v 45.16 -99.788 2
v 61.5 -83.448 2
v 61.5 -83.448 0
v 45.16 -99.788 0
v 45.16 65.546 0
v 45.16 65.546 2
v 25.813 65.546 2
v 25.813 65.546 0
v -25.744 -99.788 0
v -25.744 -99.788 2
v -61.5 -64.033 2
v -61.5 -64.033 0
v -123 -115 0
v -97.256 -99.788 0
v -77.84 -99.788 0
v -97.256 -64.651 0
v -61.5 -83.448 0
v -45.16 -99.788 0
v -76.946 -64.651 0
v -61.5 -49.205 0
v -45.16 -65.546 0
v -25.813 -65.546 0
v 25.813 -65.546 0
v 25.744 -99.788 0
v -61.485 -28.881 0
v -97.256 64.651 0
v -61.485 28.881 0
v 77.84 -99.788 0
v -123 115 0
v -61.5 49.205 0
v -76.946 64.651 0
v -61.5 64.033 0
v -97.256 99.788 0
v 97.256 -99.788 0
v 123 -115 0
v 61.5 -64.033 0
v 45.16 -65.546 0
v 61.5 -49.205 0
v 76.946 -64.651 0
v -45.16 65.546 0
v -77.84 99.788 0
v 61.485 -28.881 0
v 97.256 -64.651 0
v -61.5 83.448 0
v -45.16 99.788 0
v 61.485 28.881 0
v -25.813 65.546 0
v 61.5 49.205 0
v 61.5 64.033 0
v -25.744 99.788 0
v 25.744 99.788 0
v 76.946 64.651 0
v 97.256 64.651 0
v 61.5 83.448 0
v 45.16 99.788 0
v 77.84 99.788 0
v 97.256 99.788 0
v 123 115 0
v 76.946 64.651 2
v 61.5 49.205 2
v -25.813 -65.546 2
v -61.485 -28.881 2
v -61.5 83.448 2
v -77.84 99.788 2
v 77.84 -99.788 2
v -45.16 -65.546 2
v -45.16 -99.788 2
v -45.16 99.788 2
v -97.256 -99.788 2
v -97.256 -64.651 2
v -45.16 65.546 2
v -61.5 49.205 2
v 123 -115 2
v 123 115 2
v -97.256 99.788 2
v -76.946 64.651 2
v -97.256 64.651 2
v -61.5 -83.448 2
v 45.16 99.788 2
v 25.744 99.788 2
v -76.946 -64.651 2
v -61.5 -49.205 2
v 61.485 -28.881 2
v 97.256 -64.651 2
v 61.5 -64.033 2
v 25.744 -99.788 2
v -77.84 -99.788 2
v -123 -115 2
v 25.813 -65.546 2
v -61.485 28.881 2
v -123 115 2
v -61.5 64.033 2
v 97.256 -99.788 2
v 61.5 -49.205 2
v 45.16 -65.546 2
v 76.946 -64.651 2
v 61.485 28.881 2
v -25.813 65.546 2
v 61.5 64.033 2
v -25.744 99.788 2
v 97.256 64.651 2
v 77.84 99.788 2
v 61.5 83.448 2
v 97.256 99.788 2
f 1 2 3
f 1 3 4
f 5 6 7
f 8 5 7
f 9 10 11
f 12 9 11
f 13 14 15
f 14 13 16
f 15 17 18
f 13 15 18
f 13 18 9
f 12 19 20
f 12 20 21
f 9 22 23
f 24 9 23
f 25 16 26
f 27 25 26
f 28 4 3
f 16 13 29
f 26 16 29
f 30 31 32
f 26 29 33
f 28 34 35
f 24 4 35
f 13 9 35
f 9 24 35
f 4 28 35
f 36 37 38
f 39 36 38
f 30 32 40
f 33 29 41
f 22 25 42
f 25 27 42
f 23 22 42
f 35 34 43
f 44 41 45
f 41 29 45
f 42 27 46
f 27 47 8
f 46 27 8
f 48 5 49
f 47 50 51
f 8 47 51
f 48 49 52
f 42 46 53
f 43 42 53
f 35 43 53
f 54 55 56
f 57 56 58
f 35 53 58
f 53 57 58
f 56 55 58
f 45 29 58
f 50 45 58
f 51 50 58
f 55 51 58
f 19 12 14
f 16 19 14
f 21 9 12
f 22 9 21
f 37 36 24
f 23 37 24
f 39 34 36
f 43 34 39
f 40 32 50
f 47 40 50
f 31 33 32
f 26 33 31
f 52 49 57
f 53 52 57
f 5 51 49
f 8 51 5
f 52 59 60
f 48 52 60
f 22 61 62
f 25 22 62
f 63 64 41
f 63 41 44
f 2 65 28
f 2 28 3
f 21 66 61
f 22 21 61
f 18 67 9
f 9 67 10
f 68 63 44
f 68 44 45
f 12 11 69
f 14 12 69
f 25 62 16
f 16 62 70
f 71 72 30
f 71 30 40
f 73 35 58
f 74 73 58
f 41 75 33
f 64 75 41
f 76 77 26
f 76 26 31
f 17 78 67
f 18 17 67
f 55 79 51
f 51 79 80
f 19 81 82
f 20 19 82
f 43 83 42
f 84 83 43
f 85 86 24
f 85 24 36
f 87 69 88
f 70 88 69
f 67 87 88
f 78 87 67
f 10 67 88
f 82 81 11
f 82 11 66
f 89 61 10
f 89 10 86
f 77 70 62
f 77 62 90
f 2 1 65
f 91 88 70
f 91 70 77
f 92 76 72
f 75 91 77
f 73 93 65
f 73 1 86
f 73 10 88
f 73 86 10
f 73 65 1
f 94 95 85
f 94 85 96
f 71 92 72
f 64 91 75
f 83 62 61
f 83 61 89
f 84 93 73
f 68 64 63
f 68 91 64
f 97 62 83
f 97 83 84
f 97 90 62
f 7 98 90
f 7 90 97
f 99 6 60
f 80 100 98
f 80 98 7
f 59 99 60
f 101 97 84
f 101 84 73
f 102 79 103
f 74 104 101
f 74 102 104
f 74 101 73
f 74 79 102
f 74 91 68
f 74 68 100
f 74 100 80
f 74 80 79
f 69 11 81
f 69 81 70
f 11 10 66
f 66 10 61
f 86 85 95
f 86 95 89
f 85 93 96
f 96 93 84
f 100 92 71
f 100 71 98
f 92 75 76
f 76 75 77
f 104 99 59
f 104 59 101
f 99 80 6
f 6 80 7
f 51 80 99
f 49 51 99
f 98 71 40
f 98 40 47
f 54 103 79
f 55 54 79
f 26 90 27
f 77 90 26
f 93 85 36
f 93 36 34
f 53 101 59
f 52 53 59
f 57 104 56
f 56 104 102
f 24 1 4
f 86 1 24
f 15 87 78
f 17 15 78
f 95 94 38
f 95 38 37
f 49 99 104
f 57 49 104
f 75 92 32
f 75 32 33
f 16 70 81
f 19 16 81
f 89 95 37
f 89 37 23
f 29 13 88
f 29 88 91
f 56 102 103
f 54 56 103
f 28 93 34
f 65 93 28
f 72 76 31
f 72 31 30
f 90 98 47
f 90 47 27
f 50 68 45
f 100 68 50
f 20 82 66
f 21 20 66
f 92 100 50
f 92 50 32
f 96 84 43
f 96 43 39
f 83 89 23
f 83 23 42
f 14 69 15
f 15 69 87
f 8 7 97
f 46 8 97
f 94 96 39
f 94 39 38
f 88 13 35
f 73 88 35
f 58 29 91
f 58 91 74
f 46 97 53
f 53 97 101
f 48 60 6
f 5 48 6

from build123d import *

# Parameters (mm, degrees)
SKETCH_1_W            = 246
SKETCH_1_H            = 230
EXTRUDE_1_DEPTH       = 2
CUT_EXTRUDE_2_DEPTH   = 169.398337284
MIRROR_2_COPY_1_DEPTH = 169.398337284


with BuildPart() as part:
    # 草图1 → 凸台-拉伸1 (new body)
    with BuildSketch(Plane.XY):
        Rectangle(SKETCH_1_W, SKETCH_1_H)
    extrude(amount=EXTRUDE_1_DEPTH)

    # 草图2 → 切除-拉伸2 (cut, through all)
    with BuildSketch(Plane.XY.offset(2)):
        Polygon((-61.485344815, -28.880757709), (-97.255935728, -64.651348622), (-76.945987349, -64.651348622), (-61.5, -49.205361273), (-45.159781882, -65.545579391), (-25.813195161, -65.545579391), align=None)
        Polygon((-61.5, -64.03252581), (-97.255935728, -99.788461538), (-77.840218118, -99.788461538), (-61.5, -83.44824342), (-45.159781882, -99.788461538), (-25.744064272, -99.788461538), align=None)
    cut_extrude_2 = extrude(amount=-CUT_EXTRUDE_2_DEPTH, mode=Mode.SUBTRACT)

    # 镜向1: 切除-拉伸2 across plane
    add(cut_extrude_2.mirror(Plane.ZX), mode=Mode.SUBTRACT)

    # 镜向2: 切除-拉伸2 across plane
    add(cut_extrude_2.mirror(Plane(origin=(0, 0, 0), x_dir=(0, 0, 1), z_dir=(1, 0, 0))), mode=Mode.SUBTRACT)

    # 镜向2 copy 1 sketch → 镜向2 copy 1 (cut, through all)
    with BuildSketch(Plane(origin=(0, 0, 2), x_dir=(-1, 0, 0), z_dir=(0, 0, 1))):
        Polygon((-61.485344815, -28.880757709), (-97.255935728, -64.651348622), (-76.945987349, -64.651348622), (-61.5, -49.205361273), (-45.159781882, -65.545579391), (-25.813195161, -65.545579391), align=None)
        Polygon((-61.5, -64.03252581), (-97.255935728, -99.788461538), (-77.840218118, -99.788461538), (-61.5, -83.44824342), (-45.159781882, -99.788461538), (-25.744064272, -99.788461538), align=None)
    extrude(amount=-MIRROR_2_COPY_1_DEPTH, mode=Mode.SUBTRACT)


solid = part.part
